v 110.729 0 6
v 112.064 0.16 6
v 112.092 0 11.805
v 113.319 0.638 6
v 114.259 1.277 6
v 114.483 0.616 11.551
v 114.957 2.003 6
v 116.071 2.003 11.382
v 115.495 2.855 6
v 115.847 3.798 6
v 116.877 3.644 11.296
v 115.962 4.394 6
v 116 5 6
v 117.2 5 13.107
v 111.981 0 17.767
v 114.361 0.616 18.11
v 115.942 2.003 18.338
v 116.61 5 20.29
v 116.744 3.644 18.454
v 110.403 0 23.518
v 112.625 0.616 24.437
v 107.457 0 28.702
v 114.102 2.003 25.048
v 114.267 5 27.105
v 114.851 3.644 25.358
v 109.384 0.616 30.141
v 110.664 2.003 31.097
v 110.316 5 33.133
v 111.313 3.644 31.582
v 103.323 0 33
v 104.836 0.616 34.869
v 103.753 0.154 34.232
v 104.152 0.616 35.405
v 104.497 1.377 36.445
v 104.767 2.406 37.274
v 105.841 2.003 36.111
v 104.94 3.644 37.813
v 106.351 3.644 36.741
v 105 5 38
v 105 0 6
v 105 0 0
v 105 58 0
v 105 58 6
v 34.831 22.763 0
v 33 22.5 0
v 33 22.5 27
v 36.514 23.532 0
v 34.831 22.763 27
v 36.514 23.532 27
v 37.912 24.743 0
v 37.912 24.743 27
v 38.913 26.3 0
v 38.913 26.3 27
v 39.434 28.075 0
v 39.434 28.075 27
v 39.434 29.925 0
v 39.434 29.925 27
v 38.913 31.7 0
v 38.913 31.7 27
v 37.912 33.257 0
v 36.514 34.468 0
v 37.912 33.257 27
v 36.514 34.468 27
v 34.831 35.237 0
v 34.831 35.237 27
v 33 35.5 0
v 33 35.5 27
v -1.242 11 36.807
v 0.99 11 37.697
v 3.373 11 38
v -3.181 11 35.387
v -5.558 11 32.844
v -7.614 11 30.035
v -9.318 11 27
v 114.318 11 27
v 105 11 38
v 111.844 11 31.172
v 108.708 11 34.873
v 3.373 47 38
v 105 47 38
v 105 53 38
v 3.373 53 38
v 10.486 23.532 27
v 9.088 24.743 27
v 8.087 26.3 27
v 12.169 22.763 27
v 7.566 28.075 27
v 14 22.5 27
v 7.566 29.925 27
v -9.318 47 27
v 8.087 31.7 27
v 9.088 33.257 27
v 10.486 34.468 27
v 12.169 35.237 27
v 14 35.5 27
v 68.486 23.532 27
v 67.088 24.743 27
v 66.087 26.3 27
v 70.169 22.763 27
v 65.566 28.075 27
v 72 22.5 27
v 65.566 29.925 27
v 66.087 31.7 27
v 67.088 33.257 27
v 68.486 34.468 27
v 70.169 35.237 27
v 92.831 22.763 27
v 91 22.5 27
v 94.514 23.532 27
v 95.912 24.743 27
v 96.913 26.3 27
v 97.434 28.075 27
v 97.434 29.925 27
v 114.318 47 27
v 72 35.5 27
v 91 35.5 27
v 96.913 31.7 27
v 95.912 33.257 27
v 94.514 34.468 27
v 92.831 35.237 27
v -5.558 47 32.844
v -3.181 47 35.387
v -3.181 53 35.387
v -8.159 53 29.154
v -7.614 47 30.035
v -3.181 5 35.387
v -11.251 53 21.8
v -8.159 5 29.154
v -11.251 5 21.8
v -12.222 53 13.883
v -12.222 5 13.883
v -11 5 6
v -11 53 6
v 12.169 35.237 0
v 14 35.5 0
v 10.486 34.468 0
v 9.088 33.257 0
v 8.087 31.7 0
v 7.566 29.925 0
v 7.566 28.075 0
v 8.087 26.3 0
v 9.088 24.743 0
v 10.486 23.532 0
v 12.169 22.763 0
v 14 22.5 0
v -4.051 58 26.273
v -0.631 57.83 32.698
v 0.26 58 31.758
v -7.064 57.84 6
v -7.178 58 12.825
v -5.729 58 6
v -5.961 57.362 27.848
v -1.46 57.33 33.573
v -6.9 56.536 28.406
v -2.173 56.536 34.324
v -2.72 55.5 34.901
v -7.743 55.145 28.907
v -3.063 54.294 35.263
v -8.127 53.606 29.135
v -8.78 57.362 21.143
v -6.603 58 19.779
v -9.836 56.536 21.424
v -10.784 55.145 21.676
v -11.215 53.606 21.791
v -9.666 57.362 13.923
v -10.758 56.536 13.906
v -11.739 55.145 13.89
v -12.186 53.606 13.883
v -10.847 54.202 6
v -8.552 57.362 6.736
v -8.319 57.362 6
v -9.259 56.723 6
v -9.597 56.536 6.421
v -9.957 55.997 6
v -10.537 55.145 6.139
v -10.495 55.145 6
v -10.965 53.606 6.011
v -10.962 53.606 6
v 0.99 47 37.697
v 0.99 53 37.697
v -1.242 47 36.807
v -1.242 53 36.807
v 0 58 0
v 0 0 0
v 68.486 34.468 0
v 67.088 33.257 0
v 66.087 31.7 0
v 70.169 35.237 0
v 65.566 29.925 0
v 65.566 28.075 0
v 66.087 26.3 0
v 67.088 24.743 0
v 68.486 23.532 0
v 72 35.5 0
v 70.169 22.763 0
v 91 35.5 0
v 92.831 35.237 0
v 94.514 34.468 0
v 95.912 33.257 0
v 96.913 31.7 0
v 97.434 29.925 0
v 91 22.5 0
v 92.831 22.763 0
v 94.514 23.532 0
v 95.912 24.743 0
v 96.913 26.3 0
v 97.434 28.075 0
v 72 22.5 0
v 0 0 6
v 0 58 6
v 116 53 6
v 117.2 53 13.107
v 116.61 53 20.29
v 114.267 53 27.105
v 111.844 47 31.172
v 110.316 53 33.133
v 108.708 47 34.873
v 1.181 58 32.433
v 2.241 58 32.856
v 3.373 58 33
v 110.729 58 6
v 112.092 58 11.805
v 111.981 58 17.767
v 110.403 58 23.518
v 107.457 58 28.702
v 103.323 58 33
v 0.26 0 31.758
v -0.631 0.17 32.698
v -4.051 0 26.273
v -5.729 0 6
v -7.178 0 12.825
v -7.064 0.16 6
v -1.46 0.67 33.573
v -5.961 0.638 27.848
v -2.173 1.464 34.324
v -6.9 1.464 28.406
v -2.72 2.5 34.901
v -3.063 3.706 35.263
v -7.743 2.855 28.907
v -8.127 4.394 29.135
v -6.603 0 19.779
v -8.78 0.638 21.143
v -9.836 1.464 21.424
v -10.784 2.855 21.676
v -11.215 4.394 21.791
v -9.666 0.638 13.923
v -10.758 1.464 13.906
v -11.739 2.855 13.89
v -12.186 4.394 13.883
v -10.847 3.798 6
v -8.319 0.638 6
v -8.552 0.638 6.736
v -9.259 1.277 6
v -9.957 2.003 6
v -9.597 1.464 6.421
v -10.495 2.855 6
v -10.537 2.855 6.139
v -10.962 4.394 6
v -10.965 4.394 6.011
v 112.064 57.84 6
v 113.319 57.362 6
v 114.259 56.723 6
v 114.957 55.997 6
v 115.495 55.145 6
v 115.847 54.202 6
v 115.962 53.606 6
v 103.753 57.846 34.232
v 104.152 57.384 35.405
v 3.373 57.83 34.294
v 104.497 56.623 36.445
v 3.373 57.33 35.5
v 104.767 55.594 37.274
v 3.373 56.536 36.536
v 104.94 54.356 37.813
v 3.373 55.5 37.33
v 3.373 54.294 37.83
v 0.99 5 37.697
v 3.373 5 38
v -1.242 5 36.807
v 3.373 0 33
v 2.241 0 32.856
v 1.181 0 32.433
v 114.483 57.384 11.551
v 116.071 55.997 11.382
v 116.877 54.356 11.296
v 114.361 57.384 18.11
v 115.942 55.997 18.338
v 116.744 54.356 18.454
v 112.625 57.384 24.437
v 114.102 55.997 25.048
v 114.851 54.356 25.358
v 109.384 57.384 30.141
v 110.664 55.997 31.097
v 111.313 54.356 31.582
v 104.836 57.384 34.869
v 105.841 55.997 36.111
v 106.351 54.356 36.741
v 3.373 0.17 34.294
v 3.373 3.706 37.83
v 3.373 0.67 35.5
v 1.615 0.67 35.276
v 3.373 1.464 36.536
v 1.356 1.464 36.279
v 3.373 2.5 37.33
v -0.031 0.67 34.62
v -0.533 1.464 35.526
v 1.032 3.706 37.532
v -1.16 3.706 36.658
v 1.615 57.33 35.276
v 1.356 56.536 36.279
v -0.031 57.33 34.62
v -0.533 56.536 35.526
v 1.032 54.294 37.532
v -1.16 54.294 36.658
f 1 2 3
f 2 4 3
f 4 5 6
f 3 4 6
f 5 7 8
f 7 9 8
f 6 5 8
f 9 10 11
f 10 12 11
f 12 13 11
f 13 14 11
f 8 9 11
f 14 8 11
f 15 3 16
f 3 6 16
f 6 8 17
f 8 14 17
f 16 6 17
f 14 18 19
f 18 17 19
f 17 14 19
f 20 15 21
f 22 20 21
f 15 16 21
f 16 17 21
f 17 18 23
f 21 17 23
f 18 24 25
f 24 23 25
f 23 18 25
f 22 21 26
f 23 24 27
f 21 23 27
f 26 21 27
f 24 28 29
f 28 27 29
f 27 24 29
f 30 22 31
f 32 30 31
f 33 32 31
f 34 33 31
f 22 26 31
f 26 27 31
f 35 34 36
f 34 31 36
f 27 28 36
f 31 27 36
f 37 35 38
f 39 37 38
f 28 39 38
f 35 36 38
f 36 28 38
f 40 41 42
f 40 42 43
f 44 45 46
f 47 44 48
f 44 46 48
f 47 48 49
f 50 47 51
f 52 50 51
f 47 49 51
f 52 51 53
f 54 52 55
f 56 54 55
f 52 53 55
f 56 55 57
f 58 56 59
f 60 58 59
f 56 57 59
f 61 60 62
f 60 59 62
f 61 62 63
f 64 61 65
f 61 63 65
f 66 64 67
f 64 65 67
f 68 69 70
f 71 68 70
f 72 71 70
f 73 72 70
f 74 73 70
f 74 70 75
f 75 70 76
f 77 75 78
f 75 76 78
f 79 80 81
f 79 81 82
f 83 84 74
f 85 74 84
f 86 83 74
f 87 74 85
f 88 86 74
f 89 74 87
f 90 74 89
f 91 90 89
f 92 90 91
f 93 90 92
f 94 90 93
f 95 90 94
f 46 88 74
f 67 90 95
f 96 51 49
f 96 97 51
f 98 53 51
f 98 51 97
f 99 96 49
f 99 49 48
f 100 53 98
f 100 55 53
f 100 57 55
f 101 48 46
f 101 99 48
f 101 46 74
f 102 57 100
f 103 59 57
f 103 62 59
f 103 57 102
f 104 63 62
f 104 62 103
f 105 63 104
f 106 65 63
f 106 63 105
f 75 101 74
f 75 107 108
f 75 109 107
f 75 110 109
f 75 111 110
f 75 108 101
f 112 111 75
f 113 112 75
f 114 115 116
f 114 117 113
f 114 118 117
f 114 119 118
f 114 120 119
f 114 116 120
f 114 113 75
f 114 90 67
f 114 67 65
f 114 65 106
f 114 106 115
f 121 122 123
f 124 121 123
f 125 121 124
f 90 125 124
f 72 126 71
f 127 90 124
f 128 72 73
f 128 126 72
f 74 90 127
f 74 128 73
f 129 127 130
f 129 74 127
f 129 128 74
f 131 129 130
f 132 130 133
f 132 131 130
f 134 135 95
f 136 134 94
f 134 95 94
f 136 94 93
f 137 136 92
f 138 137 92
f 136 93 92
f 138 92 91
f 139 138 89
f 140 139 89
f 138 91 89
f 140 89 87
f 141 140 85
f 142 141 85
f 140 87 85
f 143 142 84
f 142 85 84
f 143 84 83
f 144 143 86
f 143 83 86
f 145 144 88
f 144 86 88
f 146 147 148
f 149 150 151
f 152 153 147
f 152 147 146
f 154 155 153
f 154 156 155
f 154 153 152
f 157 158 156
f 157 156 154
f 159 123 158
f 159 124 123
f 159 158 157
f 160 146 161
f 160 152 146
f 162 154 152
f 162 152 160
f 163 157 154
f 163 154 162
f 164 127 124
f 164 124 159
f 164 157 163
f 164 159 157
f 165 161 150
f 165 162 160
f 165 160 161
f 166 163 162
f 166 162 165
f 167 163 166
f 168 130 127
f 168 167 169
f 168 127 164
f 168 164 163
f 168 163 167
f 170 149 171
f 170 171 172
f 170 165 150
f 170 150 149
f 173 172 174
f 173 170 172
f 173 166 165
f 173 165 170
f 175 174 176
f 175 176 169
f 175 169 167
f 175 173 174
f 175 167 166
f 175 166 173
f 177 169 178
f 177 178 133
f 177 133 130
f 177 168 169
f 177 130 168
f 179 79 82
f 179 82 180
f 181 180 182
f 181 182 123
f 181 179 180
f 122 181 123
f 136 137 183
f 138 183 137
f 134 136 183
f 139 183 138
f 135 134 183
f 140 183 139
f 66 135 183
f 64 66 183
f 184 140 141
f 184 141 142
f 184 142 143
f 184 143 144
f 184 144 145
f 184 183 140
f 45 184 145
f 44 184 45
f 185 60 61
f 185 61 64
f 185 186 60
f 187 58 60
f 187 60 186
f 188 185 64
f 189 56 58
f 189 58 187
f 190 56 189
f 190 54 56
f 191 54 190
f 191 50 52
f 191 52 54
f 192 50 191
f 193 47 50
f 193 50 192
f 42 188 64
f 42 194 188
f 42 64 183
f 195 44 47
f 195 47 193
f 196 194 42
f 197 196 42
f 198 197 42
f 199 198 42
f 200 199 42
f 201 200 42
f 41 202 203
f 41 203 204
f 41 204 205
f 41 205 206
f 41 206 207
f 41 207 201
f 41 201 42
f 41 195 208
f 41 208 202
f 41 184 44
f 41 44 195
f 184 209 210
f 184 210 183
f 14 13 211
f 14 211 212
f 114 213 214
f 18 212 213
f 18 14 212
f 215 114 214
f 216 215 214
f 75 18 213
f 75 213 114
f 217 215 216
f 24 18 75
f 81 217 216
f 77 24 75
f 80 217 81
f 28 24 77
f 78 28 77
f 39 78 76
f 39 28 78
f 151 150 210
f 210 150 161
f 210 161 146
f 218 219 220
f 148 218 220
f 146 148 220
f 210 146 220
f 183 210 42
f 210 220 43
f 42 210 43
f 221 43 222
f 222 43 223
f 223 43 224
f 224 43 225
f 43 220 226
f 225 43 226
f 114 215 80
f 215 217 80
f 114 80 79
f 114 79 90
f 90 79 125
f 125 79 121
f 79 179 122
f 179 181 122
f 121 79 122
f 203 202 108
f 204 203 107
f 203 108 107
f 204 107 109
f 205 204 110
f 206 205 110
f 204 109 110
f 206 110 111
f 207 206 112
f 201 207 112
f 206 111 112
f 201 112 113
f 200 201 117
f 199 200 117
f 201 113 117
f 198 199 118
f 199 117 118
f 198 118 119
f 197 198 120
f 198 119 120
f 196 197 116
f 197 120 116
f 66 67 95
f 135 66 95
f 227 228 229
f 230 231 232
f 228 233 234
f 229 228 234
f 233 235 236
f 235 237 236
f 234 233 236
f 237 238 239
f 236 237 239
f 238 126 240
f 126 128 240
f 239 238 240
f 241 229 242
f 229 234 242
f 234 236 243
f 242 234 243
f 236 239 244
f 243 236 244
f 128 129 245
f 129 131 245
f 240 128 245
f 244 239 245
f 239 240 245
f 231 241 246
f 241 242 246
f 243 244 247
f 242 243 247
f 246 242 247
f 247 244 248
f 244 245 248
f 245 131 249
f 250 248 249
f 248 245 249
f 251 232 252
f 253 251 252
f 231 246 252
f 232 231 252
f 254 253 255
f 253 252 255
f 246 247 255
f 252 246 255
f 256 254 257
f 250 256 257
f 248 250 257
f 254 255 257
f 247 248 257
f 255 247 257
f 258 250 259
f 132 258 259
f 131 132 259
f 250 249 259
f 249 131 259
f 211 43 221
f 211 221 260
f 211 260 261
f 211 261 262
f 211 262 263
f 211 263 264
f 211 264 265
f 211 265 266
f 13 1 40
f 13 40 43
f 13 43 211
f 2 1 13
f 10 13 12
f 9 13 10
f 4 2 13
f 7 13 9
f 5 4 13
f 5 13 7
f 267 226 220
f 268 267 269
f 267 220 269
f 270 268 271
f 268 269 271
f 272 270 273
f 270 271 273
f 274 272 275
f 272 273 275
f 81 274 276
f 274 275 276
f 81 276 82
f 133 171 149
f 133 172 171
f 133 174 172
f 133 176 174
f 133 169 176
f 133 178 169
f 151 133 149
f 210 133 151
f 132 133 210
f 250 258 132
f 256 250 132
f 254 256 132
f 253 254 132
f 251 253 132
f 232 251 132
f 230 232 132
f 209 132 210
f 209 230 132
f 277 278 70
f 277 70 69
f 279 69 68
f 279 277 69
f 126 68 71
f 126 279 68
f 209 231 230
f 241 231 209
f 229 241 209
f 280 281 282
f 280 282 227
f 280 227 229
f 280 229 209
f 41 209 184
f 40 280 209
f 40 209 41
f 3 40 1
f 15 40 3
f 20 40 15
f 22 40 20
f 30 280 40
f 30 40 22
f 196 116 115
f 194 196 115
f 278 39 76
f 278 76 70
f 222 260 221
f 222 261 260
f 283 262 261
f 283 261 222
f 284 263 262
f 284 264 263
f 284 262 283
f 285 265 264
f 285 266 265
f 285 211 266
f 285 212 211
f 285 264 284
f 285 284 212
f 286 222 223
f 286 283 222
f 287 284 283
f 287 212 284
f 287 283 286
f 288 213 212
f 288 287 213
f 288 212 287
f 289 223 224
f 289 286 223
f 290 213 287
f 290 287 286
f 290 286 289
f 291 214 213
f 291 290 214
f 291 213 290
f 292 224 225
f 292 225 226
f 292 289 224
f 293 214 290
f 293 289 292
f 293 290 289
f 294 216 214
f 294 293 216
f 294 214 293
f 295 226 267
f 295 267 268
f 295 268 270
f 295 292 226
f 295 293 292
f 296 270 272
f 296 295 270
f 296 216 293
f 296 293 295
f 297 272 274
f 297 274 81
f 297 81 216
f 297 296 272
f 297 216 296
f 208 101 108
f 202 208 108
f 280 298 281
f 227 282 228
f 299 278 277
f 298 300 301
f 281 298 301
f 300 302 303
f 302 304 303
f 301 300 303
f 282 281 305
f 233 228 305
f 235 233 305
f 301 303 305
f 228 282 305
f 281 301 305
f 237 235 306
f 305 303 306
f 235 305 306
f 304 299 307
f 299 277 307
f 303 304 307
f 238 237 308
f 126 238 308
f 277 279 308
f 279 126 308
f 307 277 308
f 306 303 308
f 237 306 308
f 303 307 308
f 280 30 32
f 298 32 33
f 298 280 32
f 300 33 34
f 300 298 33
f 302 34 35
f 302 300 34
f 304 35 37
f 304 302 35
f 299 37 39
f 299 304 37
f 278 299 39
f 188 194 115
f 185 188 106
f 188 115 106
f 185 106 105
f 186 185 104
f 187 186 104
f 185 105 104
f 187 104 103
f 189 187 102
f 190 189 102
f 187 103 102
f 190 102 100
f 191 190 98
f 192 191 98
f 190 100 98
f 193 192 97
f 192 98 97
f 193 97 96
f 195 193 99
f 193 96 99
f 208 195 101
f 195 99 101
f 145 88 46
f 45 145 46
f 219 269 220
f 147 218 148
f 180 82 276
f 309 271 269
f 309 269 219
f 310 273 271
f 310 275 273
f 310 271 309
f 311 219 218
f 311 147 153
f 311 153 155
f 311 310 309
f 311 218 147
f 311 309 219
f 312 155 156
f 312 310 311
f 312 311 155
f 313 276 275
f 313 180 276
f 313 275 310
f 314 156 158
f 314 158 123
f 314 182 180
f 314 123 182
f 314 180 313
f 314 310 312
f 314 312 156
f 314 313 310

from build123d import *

# Parameters (mm, degrees)
F1_DEPTH = 58
F2_W     = 21.7170343468
F2_H     = 36
F2_W_2   = 18.1216797089
F2_W_3   = 101.6265741507
F3_DEPTH = 11
F5_DEPTH = 27
F6_DEPTH = 27
F7_R     = 5
F8_R     = 5


# Not quite as in the source:
# - a feature names something its author has since deleted; it is built from what else it names


with BuildPart() as f1:
    # F0 (on Front) → F1 (new body)
    with BuildSketch(Plane.XZ):
        with BuildLine():
            Line((0, 6), (0, 0))
            Line((0, 0), (105, 0))
            Line((105, 0), (105, 6))
            Line((105, 6), (116, 6))
            ThreePointArc((116, 6), (115.651030618, 23.7706667749), (105, 38))
            Line((105, 38), (3.3734258493, 38))
            ThreePointArc((3.3734258493, 38), (-0.1544899089, 37.3225666374), (-3.1805835495, 35.3866268563))
            ThreePointArc((-3.1805835495, 35.3866268563), (-11.2509687534, 21.8004179002), (-11, 6))
            Line((-11, 6), (0, 6))
        make_face()
    extrude(amount=-F1_DEPTH)

    # F2 (on face) → F3 (cut)
    with BuildSketch(Plane.XY.offset(38)):
        with Locations((115.8585171734, 29)):
            Rectangle(F2_W, F2_H)
        with Locations((-5.6874140052, 29)):
            Rectangle(F2_W_2, F2_H)
        with Locations((54.1867129246, 29)):
            Rectangle(F2_W_3, F2_H)
    extrude(amount=-F3_DEPTH, mode=Mode.SUBTRACT)

    # F4 (on face) → F5 (cut)
    with BuildSketch(Plane.XY.offset(27)):
        with BuildLine():
            Line((33, 35.5), (14, 35.5))
            ThreePointArc((14, 35.5), (7.5, 29), (14, 22.5))
            Line((14, 22.5), (33, 22.5))
            ThreePointArc((33, 22.5), (39.5, 29), (33, 35.5))
        make_face()
    extrude(amount=-F5_DEPTH, mode=Mode.SUBTRACT)

    # F4 (on face) → F6 (cut)
    with BuildSketch(Plane.XY.offset(27)):
        with BuildLine():
            Line((91, 35.5), (72, 35.5))
            ThreePointArc((72, 35.5), (65.5, 29), (72, 22.5))
            Line((72, 22.5), (91, 22.5))
            ThreePointArc((91, 22.5), (97.5, 29), (91, 35.5))
        make_face()
    extrude(amount=-F6_DEPTH, mode=Mode.SUBTRACT)

    # F7
    f7_edges = [f1.edges().sort_by_distance(p)[0] for p in [
        (54.186713, 0, 38),
        (115.651031, 0, 23.770667),
    ]]
    fillet(f7_edges, radius=F7_R)

    # F8
    f8_edges = [f1.edges().sort_by_distance(p)[0] for p in [
        (115.651031, 58, 23.770667),
        (54.186713, 58, 38),
    ]]
    fillet(f8_edges, radius=F8_R)


solid = f1.part
